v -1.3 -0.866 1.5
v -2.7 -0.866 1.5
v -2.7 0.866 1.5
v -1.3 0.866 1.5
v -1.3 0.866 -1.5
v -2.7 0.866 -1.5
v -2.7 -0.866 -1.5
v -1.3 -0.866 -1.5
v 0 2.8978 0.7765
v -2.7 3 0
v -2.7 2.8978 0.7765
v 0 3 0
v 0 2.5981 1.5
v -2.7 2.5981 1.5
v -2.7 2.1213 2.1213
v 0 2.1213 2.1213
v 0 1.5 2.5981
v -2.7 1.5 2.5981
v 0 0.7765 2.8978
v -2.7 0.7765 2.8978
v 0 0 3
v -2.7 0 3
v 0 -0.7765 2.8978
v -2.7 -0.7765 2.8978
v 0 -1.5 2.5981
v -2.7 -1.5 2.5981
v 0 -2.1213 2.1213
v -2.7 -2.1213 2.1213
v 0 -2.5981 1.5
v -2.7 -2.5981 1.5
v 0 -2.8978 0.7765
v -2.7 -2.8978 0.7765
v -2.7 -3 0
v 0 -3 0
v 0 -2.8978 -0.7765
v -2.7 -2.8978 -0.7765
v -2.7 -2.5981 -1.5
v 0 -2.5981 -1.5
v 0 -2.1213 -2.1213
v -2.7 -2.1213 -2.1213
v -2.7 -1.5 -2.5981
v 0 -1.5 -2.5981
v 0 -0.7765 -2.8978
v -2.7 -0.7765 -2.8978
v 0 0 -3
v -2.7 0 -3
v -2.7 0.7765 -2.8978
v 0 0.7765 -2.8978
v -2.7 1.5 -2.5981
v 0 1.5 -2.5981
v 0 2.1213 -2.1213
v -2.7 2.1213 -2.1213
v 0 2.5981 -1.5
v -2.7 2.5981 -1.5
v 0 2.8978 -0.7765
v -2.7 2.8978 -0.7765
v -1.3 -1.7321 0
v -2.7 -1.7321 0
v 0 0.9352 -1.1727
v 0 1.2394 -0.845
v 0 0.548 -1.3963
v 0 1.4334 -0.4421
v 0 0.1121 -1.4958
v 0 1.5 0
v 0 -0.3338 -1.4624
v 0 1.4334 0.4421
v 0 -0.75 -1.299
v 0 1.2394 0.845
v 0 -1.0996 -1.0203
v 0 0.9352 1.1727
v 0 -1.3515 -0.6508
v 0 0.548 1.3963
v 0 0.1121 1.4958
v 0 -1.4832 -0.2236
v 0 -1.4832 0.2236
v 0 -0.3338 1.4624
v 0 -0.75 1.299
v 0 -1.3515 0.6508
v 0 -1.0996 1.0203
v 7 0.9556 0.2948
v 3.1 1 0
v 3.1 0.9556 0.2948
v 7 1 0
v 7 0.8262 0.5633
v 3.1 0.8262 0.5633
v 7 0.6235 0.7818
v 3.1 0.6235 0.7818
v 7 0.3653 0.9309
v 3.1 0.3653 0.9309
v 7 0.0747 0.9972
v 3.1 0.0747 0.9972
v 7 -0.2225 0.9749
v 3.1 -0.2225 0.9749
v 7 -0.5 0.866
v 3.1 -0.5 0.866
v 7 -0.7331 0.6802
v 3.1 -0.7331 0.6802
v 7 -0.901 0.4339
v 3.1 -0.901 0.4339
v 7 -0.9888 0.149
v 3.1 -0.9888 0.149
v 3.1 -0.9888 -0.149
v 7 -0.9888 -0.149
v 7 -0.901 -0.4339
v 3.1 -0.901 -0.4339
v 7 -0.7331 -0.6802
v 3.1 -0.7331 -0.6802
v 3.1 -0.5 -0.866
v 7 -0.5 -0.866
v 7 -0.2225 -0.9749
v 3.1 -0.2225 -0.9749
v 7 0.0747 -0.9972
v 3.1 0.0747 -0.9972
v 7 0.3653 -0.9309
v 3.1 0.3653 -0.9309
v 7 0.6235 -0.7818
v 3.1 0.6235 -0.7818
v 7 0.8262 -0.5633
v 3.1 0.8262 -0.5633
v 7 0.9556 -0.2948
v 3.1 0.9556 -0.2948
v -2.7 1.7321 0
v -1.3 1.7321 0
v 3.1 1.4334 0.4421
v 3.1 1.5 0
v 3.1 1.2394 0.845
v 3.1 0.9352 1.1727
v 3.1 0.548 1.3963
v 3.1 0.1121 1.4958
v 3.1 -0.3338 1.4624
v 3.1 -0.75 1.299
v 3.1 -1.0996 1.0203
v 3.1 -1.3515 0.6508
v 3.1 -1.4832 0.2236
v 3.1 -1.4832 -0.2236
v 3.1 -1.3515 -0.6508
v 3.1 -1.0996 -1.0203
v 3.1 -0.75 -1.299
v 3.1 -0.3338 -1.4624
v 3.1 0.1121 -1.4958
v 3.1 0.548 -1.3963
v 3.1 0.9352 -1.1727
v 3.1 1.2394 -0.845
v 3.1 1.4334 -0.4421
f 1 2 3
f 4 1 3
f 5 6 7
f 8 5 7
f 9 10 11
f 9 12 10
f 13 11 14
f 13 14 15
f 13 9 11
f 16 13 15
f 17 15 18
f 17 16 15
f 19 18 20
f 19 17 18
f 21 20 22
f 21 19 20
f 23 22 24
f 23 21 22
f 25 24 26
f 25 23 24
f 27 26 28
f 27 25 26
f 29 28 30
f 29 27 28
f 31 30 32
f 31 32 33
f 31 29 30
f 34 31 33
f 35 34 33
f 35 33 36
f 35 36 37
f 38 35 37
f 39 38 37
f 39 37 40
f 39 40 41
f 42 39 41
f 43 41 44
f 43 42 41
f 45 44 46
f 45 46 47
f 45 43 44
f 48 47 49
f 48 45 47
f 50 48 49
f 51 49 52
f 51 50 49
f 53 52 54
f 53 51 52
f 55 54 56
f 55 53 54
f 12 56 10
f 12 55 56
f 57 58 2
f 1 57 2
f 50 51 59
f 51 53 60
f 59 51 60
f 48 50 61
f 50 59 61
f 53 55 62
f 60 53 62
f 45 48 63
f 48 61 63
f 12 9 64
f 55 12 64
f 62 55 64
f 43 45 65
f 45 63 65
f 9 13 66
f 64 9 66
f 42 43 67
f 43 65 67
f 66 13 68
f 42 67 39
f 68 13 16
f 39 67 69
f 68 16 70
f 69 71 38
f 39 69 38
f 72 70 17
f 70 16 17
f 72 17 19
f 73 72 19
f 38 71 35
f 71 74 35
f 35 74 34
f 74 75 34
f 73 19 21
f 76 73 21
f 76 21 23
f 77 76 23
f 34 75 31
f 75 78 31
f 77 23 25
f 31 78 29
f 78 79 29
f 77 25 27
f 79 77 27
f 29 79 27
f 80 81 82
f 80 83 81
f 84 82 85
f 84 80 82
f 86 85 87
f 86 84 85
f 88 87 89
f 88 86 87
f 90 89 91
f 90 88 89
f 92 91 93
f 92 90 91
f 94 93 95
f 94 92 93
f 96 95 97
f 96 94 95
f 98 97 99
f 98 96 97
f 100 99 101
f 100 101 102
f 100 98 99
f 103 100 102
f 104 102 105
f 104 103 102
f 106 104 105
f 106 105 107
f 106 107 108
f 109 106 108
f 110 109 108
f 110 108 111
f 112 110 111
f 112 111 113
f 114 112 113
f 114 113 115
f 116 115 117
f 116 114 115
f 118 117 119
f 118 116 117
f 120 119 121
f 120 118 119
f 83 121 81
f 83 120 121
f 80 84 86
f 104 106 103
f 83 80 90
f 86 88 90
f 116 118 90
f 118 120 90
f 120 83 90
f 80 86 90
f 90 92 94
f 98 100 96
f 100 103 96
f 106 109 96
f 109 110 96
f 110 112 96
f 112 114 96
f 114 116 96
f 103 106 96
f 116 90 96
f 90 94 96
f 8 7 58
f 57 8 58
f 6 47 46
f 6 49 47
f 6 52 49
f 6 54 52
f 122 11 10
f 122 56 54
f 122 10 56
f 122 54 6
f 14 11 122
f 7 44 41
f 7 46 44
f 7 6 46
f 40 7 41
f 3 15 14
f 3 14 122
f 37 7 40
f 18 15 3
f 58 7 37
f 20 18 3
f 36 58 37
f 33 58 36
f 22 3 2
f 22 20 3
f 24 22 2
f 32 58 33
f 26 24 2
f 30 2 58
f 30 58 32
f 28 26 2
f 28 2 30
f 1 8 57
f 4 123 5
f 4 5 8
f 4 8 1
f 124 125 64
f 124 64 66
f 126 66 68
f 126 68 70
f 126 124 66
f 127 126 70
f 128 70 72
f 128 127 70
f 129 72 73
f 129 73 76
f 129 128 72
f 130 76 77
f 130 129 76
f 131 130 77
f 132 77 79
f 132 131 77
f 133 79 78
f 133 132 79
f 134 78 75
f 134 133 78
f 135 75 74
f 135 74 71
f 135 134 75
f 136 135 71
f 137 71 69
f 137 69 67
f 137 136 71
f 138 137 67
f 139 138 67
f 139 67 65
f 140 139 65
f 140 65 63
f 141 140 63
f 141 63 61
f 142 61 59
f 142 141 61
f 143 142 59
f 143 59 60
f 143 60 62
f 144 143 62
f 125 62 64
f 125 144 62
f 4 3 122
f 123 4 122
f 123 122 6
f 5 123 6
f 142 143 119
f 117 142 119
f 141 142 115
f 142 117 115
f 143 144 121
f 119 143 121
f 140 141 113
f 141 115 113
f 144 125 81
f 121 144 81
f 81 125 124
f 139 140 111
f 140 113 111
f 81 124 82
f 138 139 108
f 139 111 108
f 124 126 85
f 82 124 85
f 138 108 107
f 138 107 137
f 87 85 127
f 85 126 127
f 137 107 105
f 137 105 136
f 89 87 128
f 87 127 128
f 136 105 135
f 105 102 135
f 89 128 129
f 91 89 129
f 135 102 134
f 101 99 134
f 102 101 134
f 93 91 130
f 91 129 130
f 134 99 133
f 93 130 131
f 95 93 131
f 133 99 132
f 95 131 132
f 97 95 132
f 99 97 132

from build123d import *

# Parameters (mm, degrees)
SCHNITT_LINEAR_AUSTRAGEN1_DEPTH = 2.7
SKIZZE3_W                       = 7
SKIZZE3_H                       = 2.1
SKIZZE4_W                       = 3.9
SKIZZE4_H                       = 0.5


with BuildPart() as part:
    # Skizze1 → Rotation1 (revolve)
    with BuildSketch(Plane.XY):
        Polygon((-4, 0), (7, 0), (7, 2), (0, 2), (0, 3.6), (-4, 3.6), align=None)
    revolve(axis=Axis((-29.304407472, 0, 0), (1, 0, 0)))

    # Skizze2 → Schnitt-Linear austragen1 (cut)
    with BuildSketch(Plane.ZY.offset(4)):
        Polygon((0, 1.732050808), (-1.5, 0.866025404), (-1.5, -0.866025404), (0, -1.732050808), (1.5, -0.866025404), (1.5, 0.866025404), align=None)
    extrude(amount=-SCHNITT_LINEAR_AUSTRAGEN1_DEPTH, mode=Mode.SUBTRACT)

    # Skizze3 → Schnitt-Rotation1 (revolve, cut)
    with BuildSketch(Plane.XY):
        with Locations((3.5, 2.55)):
            Rectangle(SKIZZE3_W, SKIZZE3_H)
    revolve(axis=Axis((-0.757628828, 0, 0), (1, 0, 0)), mode=Mode.SUBTRACT)

    # Skizze4 → Schnitt-Rotation2 (revolve, cut)
    with BuildSketch(Plane.XY):
        with Locations((5.05, 1.25)):
            Rectangle(SKIZZE4_W, SKIZZE4_H)
    revolve(axis=Axis((0, 0, 0), (1, 0, 0)), mode=Mode.SUBTRACT)

    # Skizze6 → Schnitt-Rotation3 (revolve, cut)
    with BuildSketch(Plane.XY):
        Polygon((-2.7, 3), (0, 3), (0, 3.6), (-4, 3.6), (-4, 0), (-2.7, 0), align=None)
    revolve(axis=Axis((-4.405632507, 0, 0), (1, 0, 0)), mode=Mode.SUBTRACT)


solid = part.part
